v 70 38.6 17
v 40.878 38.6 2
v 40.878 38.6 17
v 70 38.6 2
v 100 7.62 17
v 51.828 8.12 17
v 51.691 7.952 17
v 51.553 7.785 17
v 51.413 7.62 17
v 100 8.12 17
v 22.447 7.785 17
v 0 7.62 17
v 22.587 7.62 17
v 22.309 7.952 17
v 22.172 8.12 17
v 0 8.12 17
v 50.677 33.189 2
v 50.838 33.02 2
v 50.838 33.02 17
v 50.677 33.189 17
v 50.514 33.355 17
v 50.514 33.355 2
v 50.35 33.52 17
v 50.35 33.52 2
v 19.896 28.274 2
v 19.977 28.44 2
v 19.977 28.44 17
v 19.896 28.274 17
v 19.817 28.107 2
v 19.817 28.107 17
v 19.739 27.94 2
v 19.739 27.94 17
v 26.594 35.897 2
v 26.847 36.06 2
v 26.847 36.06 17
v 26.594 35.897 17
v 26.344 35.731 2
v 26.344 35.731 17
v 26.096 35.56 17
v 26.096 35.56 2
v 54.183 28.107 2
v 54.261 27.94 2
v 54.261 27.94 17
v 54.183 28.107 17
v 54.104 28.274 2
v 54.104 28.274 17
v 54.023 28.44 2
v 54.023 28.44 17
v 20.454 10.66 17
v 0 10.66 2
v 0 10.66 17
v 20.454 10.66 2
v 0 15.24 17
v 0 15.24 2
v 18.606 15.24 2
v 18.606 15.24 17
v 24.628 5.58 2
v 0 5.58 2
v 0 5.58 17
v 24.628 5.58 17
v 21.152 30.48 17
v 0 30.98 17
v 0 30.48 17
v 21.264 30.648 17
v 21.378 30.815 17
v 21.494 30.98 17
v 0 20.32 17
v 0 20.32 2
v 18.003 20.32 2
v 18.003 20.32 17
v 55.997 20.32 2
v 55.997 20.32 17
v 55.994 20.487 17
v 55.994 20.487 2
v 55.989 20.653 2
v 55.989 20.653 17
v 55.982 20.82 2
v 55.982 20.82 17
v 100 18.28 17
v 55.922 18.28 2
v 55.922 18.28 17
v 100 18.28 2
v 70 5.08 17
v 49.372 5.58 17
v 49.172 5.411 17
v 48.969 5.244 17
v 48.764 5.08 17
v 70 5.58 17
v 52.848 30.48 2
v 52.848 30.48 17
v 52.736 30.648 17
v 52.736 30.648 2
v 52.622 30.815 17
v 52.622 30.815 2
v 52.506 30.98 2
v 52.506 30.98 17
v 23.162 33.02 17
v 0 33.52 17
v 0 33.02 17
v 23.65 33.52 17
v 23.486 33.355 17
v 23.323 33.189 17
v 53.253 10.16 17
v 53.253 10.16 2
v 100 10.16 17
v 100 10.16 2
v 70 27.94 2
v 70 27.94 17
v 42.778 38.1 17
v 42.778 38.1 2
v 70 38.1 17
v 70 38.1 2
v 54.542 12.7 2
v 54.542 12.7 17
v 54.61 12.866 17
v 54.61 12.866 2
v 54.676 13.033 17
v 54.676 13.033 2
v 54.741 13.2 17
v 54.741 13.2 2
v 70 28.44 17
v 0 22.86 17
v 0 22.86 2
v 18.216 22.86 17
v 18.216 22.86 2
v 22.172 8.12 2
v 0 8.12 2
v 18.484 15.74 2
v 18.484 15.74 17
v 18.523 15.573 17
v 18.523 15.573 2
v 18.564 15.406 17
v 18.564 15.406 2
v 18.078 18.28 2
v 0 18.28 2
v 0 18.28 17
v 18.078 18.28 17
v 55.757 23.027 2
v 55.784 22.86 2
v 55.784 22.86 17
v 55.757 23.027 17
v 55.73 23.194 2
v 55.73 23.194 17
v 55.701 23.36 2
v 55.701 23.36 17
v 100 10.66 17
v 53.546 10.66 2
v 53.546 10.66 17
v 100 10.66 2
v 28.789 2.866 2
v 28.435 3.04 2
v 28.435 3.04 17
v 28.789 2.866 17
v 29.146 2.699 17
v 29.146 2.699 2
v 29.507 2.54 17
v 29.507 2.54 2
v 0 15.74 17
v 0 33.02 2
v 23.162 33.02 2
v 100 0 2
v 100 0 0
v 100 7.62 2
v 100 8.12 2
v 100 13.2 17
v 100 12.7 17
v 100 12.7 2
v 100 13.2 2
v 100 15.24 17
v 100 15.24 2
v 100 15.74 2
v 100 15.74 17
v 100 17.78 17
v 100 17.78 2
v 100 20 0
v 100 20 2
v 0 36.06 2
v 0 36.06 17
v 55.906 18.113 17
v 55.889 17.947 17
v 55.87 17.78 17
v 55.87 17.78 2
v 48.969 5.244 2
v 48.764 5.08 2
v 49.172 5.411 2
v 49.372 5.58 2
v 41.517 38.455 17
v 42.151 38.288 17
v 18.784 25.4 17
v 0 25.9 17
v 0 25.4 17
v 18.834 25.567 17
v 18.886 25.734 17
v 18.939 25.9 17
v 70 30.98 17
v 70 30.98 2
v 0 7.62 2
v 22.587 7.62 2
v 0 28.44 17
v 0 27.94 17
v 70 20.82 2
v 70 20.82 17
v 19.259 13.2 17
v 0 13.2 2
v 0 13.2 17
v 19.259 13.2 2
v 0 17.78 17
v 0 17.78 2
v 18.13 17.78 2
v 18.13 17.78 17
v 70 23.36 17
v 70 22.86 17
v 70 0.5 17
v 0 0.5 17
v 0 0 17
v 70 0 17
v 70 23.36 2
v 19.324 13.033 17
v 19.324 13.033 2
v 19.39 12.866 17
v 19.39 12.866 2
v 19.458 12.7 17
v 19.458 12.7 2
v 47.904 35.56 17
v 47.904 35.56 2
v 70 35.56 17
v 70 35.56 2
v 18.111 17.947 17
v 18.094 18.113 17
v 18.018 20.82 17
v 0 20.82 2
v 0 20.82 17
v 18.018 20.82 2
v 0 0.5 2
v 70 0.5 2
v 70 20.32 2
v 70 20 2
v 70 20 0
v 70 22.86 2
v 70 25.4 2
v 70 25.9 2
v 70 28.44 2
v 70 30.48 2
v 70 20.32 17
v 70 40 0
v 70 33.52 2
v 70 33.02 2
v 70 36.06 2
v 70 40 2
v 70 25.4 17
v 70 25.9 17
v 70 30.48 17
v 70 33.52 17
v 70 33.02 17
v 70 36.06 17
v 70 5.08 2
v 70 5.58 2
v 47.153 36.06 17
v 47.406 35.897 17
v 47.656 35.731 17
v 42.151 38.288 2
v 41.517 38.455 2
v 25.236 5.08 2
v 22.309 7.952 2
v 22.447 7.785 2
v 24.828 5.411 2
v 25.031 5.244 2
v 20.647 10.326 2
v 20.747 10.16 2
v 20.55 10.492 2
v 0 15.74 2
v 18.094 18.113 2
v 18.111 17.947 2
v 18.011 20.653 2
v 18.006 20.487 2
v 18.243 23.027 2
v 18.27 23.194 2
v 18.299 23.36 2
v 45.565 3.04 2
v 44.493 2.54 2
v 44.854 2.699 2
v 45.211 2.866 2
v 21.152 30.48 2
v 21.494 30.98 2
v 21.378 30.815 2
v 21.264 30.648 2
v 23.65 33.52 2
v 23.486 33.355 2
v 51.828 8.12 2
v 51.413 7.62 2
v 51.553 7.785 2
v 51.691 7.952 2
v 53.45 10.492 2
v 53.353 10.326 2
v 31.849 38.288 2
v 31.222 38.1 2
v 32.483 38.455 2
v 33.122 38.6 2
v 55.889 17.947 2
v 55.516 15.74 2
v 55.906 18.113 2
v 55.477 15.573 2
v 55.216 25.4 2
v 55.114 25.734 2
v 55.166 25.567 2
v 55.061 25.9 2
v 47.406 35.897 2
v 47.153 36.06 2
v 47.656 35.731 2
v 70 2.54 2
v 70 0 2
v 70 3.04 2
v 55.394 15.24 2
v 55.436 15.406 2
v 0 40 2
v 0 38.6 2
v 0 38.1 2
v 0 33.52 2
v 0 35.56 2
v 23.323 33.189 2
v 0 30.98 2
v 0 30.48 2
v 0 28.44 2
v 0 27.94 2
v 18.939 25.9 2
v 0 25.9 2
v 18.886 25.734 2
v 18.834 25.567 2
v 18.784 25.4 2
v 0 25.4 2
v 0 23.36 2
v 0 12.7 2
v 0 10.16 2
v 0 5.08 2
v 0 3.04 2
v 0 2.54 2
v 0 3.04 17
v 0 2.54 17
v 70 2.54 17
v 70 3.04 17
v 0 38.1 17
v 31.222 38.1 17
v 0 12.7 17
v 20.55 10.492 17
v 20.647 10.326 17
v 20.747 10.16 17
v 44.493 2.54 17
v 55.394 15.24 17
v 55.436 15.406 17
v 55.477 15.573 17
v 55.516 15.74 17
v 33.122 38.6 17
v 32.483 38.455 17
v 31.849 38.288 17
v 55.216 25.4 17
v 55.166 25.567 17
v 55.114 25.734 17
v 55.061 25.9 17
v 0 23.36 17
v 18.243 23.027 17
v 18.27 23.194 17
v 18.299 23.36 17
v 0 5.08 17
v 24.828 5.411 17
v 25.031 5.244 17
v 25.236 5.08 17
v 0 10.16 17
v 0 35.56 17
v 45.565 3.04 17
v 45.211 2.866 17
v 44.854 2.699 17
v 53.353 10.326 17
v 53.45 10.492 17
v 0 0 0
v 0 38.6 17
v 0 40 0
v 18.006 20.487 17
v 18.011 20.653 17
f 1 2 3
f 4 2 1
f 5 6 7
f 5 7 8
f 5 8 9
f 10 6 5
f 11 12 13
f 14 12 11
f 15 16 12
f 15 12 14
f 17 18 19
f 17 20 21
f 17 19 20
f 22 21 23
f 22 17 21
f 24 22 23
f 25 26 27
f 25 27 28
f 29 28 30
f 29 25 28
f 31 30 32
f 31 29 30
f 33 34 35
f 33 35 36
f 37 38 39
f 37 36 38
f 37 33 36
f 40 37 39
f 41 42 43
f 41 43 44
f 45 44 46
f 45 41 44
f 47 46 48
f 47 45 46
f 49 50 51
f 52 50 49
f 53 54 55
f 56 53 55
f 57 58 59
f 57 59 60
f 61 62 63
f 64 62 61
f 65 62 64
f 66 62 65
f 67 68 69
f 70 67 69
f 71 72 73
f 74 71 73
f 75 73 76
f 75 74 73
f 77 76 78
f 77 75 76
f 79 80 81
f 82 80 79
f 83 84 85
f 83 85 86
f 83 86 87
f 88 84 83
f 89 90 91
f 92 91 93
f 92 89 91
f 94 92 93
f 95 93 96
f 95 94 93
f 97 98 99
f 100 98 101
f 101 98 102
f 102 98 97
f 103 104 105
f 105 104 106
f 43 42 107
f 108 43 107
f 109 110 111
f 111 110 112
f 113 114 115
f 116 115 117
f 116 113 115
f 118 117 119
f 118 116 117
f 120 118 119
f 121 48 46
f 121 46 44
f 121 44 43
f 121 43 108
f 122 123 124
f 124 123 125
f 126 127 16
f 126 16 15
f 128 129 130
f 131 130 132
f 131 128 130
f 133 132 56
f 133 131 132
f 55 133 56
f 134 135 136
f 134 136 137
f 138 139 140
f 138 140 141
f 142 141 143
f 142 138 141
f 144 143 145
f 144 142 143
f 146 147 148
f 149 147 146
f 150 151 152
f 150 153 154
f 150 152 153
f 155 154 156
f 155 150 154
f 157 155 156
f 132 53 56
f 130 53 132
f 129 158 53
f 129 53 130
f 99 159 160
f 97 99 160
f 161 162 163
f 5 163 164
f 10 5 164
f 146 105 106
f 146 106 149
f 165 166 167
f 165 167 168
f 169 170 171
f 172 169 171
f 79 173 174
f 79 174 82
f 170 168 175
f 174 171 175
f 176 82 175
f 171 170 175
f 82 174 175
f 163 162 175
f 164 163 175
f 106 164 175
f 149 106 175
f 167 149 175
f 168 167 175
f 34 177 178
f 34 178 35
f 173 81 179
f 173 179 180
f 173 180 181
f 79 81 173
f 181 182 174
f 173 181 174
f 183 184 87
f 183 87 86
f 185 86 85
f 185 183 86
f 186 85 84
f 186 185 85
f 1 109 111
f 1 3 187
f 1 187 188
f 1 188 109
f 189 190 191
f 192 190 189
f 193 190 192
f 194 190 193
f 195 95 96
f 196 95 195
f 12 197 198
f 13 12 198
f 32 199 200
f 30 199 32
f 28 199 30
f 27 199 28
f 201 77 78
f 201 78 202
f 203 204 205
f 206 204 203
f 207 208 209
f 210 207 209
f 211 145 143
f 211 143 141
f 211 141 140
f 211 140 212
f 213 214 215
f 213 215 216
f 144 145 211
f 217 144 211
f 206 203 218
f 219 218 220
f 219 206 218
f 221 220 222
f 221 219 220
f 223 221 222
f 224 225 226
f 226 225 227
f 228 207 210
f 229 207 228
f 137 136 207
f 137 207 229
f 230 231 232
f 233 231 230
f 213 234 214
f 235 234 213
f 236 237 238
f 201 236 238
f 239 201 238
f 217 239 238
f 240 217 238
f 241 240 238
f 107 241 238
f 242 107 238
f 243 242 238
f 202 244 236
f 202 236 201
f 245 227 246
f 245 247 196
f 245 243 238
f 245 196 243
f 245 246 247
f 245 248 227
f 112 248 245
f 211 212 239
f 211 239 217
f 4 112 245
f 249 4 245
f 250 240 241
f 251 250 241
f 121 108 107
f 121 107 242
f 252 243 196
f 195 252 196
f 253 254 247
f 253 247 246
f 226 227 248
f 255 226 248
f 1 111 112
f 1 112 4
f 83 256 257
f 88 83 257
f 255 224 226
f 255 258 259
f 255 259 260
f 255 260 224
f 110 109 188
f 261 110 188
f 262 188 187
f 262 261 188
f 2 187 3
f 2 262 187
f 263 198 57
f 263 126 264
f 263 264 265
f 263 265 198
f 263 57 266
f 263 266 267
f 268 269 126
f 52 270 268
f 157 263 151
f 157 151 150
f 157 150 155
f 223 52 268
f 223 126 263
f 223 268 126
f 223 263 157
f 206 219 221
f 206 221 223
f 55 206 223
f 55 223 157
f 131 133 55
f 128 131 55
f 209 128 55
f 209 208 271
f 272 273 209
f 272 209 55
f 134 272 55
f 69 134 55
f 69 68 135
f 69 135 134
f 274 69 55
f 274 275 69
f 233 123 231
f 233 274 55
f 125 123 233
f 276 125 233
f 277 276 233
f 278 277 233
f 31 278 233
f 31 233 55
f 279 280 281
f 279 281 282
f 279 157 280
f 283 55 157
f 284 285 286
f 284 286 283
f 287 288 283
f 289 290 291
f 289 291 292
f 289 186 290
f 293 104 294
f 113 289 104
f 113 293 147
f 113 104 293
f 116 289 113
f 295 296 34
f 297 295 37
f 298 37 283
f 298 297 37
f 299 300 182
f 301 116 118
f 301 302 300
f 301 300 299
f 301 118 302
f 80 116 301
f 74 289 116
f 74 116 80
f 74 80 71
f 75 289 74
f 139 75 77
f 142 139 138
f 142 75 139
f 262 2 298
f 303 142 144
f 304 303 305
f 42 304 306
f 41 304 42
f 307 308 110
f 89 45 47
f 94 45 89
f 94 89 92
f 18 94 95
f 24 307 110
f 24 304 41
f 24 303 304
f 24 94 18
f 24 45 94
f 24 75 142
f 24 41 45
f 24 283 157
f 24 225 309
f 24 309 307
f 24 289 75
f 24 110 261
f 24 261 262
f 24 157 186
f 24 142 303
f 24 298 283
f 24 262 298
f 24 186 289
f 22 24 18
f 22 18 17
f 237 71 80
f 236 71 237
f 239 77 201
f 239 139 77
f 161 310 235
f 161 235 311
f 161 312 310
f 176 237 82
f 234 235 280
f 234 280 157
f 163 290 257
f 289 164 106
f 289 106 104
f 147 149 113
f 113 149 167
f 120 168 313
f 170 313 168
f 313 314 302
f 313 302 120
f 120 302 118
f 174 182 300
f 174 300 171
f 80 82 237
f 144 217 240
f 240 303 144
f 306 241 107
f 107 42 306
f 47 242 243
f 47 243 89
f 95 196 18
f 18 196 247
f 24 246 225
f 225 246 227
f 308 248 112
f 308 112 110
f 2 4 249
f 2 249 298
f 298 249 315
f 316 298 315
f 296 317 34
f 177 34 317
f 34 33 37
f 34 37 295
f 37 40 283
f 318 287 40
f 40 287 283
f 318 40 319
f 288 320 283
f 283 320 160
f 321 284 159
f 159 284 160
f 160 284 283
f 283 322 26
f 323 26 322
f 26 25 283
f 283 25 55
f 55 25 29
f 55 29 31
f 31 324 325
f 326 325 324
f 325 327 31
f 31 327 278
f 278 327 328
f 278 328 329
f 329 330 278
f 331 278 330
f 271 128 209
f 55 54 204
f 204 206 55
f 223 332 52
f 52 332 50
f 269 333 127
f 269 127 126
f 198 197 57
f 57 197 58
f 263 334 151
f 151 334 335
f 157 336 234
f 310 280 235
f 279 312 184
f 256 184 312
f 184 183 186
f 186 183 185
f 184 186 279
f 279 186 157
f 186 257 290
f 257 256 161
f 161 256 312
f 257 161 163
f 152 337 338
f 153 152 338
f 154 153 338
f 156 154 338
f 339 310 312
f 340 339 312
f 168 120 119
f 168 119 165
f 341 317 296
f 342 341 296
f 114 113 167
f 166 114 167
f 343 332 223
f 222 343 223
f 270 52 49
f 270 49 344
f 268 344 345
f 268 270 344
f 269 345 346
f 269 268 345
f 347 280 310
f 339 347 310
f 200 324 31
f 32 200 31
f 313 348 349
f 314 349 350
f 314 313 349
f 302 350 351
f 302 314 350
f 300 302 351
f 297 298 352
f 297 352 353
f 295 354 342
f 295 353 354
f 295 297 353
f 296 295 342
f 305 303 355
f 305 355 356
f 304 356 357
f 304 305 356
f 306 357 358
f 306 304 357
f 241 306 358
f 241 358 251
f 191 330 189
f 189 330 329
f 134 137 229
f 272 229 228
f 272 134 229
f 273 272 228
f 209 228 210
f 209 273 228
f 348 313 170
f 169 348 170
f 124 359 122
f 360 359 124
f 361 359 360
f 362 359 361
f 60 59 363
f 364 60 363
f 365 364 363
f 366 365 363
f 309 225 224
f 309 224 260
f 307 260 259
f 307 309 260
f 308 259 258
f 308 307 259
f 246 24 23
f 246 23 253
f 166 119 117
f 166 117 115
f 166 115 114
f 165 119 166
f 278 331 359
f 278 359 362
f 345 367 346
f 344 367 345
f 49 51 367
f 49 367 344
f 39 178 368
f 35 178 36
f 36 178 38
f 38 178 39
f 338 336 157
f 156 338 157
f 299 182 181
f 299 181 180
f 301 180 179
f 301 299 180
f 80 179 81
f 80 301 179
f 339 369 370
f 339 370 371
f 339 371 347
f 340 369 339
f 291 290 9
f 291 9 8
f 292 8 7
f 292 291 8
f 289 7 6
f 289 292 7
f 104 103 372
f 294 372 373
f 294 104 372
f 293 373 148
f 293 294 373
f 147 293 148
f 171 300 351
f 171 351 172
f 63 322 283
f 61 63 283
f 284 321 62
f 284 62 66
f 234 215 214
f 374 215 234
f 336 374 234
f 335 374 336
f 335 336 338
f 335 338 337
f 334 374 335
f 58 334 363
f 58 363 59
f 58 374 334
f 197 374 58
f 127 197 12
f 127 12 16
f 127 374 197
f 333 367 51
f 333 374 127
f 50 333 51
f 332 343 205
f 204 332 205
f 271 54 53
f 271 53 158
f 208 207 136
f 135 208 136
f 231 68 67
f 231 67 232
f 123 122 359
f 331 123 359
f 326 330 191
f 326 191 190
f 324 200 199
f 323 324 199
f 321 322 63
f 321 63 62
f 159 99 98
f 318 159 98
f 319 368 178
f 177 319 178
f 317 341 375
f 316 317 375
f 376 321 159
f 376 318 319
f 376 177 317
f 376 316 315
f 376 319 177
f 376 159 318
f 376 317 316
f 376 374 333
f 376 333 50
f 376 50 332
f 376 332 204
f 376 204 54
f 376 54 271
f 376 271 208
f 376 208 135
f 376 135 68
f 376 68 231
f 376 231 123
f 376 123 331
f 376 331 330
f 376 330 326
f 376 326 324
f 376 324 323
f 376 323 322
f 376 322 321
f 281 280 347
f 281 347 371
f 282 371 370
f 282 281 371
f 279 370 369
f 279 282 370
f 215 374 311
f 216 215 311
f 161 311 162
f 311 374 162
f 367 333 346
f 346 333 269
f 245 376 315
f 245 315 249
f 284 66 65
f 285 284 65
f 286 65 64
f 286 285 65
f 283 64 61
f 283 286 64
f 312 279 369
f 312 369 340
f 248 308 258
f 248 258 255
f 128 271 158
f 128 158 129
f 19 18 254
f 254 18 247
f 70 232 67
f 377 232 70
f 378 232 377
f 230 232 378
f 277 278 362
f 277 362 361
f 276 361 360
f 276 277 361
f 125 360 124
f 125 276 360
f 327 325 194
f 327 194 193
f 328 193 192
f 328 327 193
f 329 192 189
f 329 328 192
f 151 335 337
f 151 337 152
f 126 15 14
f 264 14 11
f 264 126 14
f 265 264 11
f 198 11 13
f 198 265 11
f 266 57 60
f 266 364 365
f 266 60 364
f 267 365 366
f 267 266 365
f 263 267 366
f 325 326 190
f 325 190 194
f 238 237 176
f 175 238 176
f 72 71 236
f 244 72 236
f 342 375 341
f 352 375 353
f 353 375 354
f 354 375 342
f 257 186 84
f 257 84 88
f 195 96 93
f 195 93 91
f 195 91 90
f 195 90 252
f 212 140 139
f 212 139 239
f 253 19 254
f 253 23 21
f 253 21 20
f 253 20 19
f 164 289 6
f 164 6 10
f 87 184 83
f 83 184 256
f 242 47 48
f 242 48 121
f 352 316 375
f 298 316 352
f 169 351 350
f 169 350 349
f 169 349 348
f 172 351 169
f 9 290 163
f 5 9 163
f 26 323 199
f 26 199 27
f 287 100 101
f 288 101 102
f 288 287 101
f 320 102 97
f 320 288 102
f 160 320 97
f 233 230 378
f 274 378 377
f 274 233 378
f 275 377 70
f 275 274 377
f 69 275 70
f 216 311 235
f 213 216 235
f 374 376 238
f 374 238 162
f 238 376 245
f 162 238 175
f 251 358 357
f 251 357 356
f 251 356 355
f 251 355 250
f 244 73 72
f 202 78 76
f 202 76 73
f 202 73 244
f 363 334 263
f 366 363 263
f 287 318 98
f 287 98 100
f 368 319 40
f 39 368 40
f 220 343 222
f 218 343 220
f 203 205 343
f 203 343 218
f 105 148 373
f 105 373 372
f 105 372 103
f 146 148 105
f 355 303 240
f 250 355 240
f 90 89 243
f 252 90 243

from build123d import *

# Parameters (mm, degrees)
MAIN_SKETCH_W              = 100
MAIN_SKETCH_H              = 40
MAIN_DEPTH                 = 2
ESQUISSE2_W                = 100
ESQUISSE2_H                = 0.5
BOSS_EXTRU_2_DEPTH         = 15
R_P_TITION_LIN_AIRE2_COUNT = 16
R_P_TITION_LIN_AIRE2_PITCH = 2.54
ESQUISSE3_W                = 30
ESQUISSE3_H                = 7.5
ENL_V_MAT_EXTRU_1_DEPTH    = 16
ESQUISSE4_W                = 30
ESQUISSE4_H                = 20
ENL_V_MAT_EXTRU_2_DEPTH    = 25
ESQUISSE5_R                = 19
ENL_V_MAT_EXTRU_3_DEPTH    = 16


with BuildPart() as part:
    # Main-Sketch → Main (new body)
    with BuildSketch(Plane.XY):
        with Locations((50, 20)):
            Rectangle(MAIN_SKETCH_W, MAIN_SKETCH_H)
    extrude(amount=MAIN_DEPTH)

    # Esquisse2 → Boss.-Extru.2 (add)
    with BuildSketch(Plane.XY.offset(2)):
        with Locations((50, 0.25)):
            Rectangle(ESQUISSE2_W, ESQUISSE2_H)
    boss_extru_2 = extrude(amount=BOSS_EXTRU_2_DEPTH)

    # Répétition linéaire2: Boss.-Extru.2 ×16
    with Locations(*[(0, i * R_P_TITION_LIN_AIRE2_PITCH, 0) for i in range(1, R_P_TITION_LIN_AIRE2_COUNT)]):
        add(boss_extru_2)

    # Esquisse3 → Enlèv. mat.-Extru.1 (cut, through all)
    with BuildSketch(Plane.XY.offset(2)):
        with Locations((85, 3.75)):
            Rectangle(ESQUISSE3_W, ESQUISSE3_H)
    extrude(amount=ENL_V_MAT_EXTRU_1_DEPTH, mode=Mode.SUBTRACT)

    # Esquisse4 → Enlèv. mat.-Extru.2 (cut, symmetric)
    with BuildSketch(Plane.XY.offset(2)):
        with Locations((85, 30)):
            Rectangle(ESQUISSE4_W, ESQUISSE4_H)
    extrude(amount=ENL_V_MAT_EXTRU_2_DEPTH, both=True, mode=Mode.SUBTRACT)

    # Esquisse5 → Enlèv. mat.-Extru.3 (cut, through all)
    with BuildSketch(Plane.XY.offset(2)):
        with Locations((37, 20)):
            Circle(ESQUISSE5_R)
    extrude(amount=ENL_V_MAT_EXTRU_3_DEPTH, mode=Mode.SUBTRACT)


solid = part.part
